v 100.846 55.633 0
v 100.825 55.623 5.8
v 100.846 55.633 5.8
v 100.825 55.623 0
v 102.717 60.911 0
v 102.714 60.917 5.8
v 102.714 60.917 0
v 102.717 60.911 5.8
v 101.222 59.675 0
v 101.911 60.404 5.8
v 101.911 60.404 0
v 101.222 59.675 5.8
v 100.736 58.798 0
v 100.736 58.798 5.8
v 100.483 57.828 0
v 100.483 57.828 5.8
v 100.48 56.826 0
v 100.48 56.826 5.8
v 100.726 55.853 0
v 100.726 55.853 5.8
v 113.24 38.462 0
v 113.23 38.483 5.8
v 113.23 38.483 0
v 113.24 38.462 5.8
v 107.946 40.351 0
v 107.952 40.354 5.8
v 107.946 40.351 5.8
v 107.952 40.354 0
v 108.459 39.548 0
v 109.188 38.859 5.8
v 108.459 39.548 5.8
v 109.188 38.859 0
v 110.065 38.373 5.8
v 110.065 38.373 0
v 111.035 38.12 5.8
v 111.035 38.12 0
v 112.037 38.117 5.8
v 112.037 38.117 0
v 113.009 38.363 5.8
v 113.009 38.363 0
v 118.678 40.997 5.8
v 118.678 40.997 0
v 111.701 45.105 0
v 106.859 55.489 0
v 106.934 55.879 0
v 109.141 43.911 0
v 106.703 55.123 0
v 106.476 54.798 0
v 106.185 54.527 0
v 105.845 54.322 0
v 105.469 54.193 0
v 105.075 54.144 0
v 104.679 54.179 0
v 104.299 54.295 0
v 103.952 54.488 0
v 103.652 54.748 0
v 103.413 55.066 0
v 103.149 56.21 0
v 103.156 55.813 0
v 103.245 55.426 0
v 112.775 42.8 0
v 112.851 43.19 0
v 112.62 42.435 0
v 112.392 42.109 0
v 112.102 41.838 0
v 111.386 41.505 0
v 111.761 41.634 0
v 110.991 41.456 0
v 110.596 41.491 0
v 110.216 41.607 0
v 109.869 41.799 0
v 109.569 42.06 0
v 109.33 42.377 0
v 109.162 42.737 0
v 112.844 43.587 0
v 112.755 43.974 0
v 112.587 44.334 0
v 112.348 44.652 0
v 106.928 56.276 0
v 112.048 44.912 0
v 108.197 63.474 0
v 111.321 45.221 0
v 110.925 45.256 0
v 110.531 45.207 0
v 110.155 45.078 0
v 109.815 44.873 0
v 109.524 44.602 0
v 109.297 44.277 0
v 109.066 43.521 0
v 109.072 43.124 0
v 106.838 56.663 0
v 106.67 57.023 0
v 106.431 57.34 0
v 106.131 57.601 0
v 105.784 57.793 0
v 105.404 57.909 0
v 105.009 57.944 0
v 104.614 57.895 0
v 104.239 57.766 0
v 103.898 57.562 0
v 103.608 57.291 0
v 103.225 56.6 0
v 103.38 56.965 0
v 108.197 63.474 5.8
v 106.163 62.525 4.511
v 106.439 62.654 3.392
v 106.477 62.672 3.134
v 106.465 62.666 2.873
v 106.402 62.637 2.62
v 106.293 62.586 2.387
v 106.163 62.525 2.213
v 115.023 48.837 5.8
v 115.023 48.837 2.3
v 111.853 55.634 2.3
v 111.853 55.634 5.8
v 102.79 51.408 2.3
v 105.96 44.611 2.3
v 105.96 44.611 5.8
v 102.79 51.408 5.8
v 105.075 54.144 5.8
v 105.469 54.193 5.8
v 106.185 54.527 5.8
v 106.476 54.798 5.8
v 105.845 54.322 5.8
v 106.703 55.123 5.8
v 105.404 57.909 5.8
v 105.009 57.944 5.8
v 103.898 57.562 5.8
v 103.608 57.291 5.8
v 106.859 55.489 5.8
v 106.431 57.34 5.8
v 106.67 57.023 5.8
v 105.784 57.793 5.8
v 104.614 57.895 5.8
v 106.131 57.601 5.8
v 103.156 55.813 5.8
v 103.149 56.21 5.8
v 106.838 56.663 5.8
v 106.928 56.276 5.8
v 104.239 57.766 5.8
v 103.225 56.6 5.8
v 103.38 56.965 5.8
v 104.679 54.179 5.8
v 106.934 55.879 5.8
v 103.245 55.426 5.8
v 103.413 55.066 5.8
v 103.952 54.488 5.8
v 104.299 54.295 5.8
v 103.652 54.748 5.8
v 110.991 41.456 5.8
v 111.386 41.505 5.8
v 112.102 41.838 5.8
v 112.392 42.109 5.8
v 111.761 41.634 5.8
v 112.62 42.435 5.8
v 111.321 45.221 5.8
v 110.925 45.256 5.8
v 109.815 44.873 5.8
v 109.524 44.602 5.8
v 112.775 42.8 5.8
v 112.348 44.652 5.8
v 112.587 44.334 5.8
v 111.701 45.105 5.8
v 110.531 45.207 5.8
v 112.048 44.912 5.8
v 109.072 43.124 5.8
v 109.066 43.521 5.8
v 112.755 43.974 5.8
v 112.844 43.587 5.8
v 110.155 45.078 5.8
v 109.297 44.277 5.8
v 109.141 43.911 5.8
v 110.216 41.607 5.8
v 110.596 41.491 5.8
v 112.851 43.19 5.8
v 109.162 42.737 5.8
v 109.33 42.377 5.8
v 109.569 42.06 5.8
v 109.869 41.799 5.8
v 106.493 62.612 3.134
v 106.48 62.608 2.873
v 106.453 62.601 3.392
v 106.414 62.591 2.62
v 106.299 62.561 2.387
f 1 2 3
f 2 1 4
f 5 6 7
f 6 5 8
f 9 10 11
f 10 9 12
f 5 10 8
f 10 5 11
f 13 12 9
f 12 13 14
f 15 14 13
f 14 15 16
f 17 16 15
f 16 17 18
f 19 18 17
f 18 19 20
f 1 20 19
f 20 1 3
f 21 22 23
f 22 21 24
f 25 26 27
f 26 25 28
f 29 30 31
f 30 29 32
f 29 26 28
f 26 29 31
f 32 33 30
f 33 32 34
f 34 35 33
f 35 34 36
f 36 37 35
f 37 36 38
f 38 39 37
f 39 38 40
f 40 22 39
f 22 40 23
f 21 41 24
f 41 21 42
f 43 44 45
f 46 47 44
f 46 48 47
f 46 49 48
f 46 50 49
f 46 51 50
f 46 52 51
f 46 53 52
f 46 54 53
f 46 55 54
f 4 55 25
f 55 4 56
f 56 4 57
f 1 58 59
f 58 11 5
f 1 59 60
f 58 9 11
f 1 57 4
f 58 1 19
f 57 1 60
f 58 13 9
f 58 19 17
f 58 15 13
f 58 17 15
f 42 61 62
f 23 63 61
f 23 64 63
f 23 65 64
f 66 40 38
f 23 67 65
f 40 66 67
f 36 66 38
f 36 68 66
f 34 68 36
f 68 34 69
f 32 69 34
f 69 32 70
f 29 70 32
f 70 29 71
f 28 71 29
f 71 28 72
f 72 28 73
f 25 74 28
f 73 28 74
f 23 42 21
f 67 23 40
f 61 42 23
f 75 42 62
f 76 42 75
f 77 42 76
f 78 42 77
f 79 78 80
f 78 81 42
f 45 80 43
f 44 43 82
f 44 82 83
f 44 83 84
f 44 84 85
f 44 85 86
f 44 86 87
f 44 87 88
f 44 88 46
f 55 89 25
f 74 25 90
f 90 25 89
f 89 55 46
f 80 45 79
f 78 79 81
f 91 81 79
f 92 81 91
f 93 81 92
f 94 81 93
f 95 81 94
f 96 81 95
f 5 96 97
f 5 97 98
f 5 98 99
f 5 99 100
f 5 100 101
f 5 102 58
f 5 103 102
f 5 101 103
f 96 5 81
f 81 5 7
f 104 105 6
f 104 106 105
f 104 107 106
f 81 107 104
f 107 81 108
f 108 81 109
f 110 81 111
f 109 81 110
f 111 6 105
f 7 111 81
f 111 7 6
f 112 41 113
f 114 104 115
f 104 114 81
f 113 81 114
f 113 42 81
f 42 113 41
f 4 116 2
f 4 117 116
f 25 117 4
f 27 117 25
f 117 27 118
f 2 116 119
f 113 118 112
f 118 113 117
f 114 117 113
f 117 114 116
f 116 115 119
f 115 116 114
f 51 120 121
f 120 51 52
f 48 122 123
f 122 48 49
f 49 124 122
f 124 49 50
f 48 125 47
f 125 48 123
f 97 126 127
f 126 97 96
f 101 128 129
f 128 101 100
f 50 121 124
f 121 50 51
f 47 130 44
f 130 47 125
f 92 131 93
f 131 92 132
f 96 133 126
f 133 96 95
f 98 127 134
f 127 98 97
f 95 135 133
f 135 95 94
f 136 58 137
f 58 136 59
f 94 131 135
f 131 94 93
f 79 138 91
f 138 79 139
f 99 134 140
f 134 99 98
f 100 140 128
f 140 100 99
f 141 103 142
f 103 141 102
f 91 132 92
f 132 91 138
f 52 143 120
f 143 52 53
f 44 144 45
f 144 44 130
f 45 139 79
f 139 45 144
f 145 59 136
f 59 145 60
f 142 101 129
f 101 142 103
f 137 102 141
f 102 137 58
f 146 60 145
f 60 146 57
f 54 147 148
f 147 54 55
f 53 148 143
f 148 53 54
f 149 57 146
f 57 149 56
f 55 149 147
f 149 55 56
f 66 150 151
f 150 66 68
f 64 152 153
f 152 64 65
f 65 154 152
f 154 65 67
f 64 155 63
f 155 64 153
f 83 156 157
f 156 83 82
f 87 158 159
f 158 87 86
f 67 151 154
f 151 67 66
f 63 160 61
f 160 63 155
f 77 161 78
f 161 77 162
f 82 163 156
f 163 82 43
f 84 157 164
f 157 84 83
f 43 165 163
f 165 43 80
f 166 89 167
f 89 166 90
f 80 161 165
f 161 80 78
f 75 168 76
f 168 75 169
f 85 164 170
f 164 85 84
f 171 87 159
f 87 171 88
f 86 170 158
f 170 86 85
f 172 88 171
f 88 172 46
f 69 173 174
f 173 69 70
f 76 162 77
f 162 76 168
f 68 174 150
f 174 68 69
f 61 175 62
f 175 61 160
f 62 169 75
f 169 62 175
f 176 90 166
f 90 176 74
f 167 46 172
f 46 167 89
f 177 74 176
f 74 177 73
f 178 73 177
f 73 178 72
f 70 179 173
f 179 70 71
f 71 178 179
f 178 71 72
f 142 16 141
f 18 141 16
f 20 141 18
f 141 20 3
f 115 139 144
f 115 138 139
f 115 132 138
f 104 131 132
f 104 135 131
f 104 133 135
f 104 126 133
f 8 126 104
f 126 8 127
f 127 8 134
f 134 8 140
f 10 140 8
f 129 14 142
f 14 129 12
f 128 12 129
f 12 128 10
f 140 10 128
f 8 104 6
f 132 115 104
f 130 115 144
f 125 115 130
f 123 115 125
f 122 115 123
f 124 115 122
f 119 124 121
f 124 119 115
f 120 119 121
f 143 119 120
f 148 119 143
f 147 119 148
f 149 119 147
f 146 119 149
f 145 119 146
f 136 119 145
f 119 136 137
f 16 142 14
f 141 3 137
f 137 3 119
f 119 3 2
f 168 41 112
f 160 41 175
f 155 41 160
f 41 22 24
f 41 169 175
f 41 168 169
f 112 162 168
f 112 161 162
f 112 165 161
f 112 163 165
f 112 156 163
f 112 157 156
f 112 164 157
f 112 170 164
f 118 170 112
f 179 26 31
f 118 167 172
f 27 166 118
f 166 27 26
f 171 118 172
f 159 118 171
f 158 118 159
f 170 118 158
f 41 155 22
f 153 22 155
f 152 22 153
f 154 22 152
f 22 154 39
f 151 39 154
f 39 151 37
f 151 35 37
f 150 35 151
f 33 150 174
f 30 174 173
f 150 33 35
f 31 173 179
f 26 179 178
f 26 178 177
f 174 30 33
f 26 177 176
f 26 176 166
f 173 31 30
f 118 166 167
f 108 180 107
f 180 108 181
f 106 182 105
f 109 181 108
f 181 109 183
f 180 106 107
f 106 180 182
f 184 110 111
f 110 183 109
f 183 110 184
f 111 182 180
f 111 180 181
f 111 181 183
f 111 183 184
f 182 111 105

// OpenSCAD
// EMAX nighthawk accessories  - a OpenSCAD 
// Copyright (C) 2016  Gerard Valade

// This program is free software: you can redistribute it and/or modify
// it under the terms of the GNU General Public License as published by
// the Free Software Foundation, either version 3 of the License, or
// (at your option) any later version.

// This program is distributed in the hope that it will be useful,
// but WITHOUT ANY WARRANTY; without even the implied warranty of
// MERCHANTABILITY or FITNESS FOR A PARTICULAR PURPOSE.  See the
// GNU General Public License for more details.

// You should have received a copy of the GNU General Public License
// along with this program.  If not, see <http://www.gnu.org/licenses/>.

$fn=30;


module cleanhawk_top_frame()
{
	thin = 1.5;
	height = 10;
	M3_hole = 3.8;
	arm_height = height - 4.2;
	arm_lenght = 94;
	arm_width = 24.8;
	corner_dia = 2;
	
	module frame_back()
	{
		/*translate([0, 0.5, 0])
		{
			translate([0, 59.1, 0]) difference() {
				union() {
					translate([0, 0, 0]) cube([10, thin, height]);
					translate([10, 0, 0]) rotate([0, 0, 14.7]) cube([18.5, thin, height]);
					translate([0, -5.75, 0]) cube([8.5/2, 7.4, height]);
				}
				translate([-0.01, -4.75, -0.1]) cube([6.5/2, 6.5, height+1]);
			}
		
		}*/
		translate([0, 59.1+0.8, 0]) difference() {
			union() {
				translate([0, 0, 0]) cube([10, thin, height]);
				translate([10, 0, 0]) rotate([0, 0, 14.7]) cube([18.5, thin, height]);
				translate([0, -5.75-0.3, 0]) cube([8.5/2, 7.4, height]);
			}
			translate([-0.01, -4.75-0.3, -0.1]) cube([6.5/2, 6.5+0.5, height+1]);
		}
	}
	
	module frame_front()
	{
		translate([0, -70-0.8, 0])
		{
			difference() {
				union() {
					translate([0, 0, 0]) cube([8, thin, height]);
					translate([0, 0, 0]) cube([8.5/2, 8.8, height]);
				}
				translate([-0.01, -0.05, -0.1]) cube([6.5/2, 6.5+1, height+1]);
			}
			translate([8, 1, 0]) cylinder(d = corner_dia, h=height);
			translate([8, 0, 0]) rotate([0, 0, 12.5]) {
				difference() {
					cube([20.5, thin, height]);
					for(i = [0, 1, -1])
					translate([20.5/2+i*5, 10, height/2]) rotate([90, -15, 0]) hull()
					{
						translate([0, 2, 0]) cylinder(d = 2.5, h=20);
						translate([0, -2, 0]) cylinder(d = 2.5, h=20);
					}
				}
				
			}
		
		}
	}
	module arm()
	{
		translate([-arm_width/2, 0, 0])  difference()
		{
			translate([0, -5, 0]) rotate([0, 0, 0]) cube([arm_width, arm_lenght, 3]); 	
		}
	}

	module arm_holder(hole=false)
	{
		arm_lenght = 10;
		module createMeniscus(h,radius) // This module creates the shape that needs to be substracted from a cube to make its corners rounded.
			difference(){        //This shape is basicly the difference between a quarter of cylinder and a cube
		   		translate([radius/2+0.1,radius/2+0.1,0]){
		      		cube([radius+0.2,radius+0.1,h+0.2],center=true);         // All that 0.x numbers are to avoid "ghost boundaries" when substracting
		   		}
		
		   	cylinder(h=h+0.2,r=radius,$fn = 25,center=true);
		}


		module roundCornersCube(x,y,z,r)  // Now we just substract the shape we have created in the four corners
		difference(){
		   cube([x,y,z], center=true);
		
		      translate([-x/2+r,-y/2+r]){ // ... 
		      rotate(180){
		         createMeniscus(z,r);
		      }
		   }
		      translate([x/2-r,-y/2+r]){
		      rotate(270){
		         createMeniscus(z,r);
		      }
		   }
		}

		
		translate([28, 49.7, 0]) rotate([0, 0, -65])
		translate([0, 0, 0])  
		{
			if (!hole) translate([0, 1, height/2]) roundCornersCube(arm_width, arm_lenght, height, 4);
			
			if (hole) { 	
				#translate([0, -0, 3.5+arm_height-3.5]) cube([7.5, arm_lenght+5, 7], center=true);
				//#translate([0, -0, 3.5+6]) cube([7.5, arm_lenght+5, 7], center=true);
				translate([0-7, 0, -1]) cylinder(d=M3_hole, h=10);
				translate([0+7, 0, -1]) cylinder(d=M3_hole, h=10);
				translate([0, -5, 5+arm_height]) rotate([0, 0, 0]) cube([arm_width+0.8, 25, 10], center=true); 
			}
		}
	}
	
	module half1()
	{
		difference(){
			union() {
				//#translate([28-0.4, 64.5+0.8, 0]) cylinder(d = corner_dia, h=height);
				//translate([27.5, 64, 0]) rotate([0, 0, -65]) translate([-0.9, 0, 0]) cube([28.3, thin, height]);
//				translate([39.7, 39.5, 0]) cylinder(d = corner_dia, h=height);
//				translate([38.9, 39.6, 0]) rotate([0, 0, -130]) cube([17.8, thin, height]);
//				translate([28.2, 25.7, 0]) cylinder(d = corner_dia, h=height);
//				translate([27.3, 25.5, 0]) rotate([0, 0, -90]) cube([26, thin, height]); 
				arm_holder();
		
			}
			arm_holder(true);
			for(i = [0:3])
				translate([15, 5+i*5.5, height/2]) rotate([0, 90, 0]) rotate([0, 0, 15]) hull()
				{
					translate([2, 0, 0]) cylinder(d = 2.5, h=20);
					translate([-2, 0, 0]) cylinder(d = 2.5, h=20);
				}
		}
	}
	module half()
	{
		//frame_back();
		half1();
		//mirror([0, 1, 0]) half1();
		//frame_front();
	}
	difference() {
		union() {
			translate([0, 0, 0]) half();
			//mirror([1, 0, 0]) half();
		}
		//#translate([-0.0, 57.5, height/2]) cube([6.5, 6.5, height+1], center=true);
		//#translate([-0.0, -67, height/2]) cube([6.5, 6.5, height+1], center=true);
		translate([0, 66, 0]) rotate([0, 0, 14.7]) 
				for(i = [0:3])
				translate([11+i*4, 0, height/2])  rotate([90, -15, 0]) hull()
				{
					translate([0, 2, 0]) cylinder(d = 2.5, h=10);
					translate([0, -2, 0]) cylinder(d = 2.5, h=10);
				}
		translate([-8-6-2.5, 70, 8]) rotate([90, 0, 0])
		{ 
			hull()
			{
				translate([0, 0, 0]) cylinder(d = 6, h=20);
				translate([5, 0, 0]) cylinder(d = 6, h=20);
			}
			hull()
			{
				translate([0, 0, 0]) cylinder(d = 6, h=20);
				translate([0, 2, 0]) cylinder(d = 6, h=20);
			}
			hull()
			{
				translate([5, 0, 0]) cylinder(d = 6, h=20);
				translate([5, 2, 0]) cylinder(d = 6, h=20);
			}
		
		}
			
	}
		
}

module hole()
{
	head_dia=5.37;
	dia = 3.5;
	height = 20;
	color("yellow") for(x =[1, -1])
	for(y =[1, -1])
	{
		translate([ x*(55.5-head_dia)/2, y*(117.5-head_dia)/2, 0]) cylinder(d = dia, h=height);
		translate([ x*(67.20-head_dia)/2, y*(92-head_dia)/2, 0]) cylinder(d = dia, h=height);
		
	}
}

translate([80, 0, 0]) rotate([0, 0, 0]) cleanhawk_top_frame();
